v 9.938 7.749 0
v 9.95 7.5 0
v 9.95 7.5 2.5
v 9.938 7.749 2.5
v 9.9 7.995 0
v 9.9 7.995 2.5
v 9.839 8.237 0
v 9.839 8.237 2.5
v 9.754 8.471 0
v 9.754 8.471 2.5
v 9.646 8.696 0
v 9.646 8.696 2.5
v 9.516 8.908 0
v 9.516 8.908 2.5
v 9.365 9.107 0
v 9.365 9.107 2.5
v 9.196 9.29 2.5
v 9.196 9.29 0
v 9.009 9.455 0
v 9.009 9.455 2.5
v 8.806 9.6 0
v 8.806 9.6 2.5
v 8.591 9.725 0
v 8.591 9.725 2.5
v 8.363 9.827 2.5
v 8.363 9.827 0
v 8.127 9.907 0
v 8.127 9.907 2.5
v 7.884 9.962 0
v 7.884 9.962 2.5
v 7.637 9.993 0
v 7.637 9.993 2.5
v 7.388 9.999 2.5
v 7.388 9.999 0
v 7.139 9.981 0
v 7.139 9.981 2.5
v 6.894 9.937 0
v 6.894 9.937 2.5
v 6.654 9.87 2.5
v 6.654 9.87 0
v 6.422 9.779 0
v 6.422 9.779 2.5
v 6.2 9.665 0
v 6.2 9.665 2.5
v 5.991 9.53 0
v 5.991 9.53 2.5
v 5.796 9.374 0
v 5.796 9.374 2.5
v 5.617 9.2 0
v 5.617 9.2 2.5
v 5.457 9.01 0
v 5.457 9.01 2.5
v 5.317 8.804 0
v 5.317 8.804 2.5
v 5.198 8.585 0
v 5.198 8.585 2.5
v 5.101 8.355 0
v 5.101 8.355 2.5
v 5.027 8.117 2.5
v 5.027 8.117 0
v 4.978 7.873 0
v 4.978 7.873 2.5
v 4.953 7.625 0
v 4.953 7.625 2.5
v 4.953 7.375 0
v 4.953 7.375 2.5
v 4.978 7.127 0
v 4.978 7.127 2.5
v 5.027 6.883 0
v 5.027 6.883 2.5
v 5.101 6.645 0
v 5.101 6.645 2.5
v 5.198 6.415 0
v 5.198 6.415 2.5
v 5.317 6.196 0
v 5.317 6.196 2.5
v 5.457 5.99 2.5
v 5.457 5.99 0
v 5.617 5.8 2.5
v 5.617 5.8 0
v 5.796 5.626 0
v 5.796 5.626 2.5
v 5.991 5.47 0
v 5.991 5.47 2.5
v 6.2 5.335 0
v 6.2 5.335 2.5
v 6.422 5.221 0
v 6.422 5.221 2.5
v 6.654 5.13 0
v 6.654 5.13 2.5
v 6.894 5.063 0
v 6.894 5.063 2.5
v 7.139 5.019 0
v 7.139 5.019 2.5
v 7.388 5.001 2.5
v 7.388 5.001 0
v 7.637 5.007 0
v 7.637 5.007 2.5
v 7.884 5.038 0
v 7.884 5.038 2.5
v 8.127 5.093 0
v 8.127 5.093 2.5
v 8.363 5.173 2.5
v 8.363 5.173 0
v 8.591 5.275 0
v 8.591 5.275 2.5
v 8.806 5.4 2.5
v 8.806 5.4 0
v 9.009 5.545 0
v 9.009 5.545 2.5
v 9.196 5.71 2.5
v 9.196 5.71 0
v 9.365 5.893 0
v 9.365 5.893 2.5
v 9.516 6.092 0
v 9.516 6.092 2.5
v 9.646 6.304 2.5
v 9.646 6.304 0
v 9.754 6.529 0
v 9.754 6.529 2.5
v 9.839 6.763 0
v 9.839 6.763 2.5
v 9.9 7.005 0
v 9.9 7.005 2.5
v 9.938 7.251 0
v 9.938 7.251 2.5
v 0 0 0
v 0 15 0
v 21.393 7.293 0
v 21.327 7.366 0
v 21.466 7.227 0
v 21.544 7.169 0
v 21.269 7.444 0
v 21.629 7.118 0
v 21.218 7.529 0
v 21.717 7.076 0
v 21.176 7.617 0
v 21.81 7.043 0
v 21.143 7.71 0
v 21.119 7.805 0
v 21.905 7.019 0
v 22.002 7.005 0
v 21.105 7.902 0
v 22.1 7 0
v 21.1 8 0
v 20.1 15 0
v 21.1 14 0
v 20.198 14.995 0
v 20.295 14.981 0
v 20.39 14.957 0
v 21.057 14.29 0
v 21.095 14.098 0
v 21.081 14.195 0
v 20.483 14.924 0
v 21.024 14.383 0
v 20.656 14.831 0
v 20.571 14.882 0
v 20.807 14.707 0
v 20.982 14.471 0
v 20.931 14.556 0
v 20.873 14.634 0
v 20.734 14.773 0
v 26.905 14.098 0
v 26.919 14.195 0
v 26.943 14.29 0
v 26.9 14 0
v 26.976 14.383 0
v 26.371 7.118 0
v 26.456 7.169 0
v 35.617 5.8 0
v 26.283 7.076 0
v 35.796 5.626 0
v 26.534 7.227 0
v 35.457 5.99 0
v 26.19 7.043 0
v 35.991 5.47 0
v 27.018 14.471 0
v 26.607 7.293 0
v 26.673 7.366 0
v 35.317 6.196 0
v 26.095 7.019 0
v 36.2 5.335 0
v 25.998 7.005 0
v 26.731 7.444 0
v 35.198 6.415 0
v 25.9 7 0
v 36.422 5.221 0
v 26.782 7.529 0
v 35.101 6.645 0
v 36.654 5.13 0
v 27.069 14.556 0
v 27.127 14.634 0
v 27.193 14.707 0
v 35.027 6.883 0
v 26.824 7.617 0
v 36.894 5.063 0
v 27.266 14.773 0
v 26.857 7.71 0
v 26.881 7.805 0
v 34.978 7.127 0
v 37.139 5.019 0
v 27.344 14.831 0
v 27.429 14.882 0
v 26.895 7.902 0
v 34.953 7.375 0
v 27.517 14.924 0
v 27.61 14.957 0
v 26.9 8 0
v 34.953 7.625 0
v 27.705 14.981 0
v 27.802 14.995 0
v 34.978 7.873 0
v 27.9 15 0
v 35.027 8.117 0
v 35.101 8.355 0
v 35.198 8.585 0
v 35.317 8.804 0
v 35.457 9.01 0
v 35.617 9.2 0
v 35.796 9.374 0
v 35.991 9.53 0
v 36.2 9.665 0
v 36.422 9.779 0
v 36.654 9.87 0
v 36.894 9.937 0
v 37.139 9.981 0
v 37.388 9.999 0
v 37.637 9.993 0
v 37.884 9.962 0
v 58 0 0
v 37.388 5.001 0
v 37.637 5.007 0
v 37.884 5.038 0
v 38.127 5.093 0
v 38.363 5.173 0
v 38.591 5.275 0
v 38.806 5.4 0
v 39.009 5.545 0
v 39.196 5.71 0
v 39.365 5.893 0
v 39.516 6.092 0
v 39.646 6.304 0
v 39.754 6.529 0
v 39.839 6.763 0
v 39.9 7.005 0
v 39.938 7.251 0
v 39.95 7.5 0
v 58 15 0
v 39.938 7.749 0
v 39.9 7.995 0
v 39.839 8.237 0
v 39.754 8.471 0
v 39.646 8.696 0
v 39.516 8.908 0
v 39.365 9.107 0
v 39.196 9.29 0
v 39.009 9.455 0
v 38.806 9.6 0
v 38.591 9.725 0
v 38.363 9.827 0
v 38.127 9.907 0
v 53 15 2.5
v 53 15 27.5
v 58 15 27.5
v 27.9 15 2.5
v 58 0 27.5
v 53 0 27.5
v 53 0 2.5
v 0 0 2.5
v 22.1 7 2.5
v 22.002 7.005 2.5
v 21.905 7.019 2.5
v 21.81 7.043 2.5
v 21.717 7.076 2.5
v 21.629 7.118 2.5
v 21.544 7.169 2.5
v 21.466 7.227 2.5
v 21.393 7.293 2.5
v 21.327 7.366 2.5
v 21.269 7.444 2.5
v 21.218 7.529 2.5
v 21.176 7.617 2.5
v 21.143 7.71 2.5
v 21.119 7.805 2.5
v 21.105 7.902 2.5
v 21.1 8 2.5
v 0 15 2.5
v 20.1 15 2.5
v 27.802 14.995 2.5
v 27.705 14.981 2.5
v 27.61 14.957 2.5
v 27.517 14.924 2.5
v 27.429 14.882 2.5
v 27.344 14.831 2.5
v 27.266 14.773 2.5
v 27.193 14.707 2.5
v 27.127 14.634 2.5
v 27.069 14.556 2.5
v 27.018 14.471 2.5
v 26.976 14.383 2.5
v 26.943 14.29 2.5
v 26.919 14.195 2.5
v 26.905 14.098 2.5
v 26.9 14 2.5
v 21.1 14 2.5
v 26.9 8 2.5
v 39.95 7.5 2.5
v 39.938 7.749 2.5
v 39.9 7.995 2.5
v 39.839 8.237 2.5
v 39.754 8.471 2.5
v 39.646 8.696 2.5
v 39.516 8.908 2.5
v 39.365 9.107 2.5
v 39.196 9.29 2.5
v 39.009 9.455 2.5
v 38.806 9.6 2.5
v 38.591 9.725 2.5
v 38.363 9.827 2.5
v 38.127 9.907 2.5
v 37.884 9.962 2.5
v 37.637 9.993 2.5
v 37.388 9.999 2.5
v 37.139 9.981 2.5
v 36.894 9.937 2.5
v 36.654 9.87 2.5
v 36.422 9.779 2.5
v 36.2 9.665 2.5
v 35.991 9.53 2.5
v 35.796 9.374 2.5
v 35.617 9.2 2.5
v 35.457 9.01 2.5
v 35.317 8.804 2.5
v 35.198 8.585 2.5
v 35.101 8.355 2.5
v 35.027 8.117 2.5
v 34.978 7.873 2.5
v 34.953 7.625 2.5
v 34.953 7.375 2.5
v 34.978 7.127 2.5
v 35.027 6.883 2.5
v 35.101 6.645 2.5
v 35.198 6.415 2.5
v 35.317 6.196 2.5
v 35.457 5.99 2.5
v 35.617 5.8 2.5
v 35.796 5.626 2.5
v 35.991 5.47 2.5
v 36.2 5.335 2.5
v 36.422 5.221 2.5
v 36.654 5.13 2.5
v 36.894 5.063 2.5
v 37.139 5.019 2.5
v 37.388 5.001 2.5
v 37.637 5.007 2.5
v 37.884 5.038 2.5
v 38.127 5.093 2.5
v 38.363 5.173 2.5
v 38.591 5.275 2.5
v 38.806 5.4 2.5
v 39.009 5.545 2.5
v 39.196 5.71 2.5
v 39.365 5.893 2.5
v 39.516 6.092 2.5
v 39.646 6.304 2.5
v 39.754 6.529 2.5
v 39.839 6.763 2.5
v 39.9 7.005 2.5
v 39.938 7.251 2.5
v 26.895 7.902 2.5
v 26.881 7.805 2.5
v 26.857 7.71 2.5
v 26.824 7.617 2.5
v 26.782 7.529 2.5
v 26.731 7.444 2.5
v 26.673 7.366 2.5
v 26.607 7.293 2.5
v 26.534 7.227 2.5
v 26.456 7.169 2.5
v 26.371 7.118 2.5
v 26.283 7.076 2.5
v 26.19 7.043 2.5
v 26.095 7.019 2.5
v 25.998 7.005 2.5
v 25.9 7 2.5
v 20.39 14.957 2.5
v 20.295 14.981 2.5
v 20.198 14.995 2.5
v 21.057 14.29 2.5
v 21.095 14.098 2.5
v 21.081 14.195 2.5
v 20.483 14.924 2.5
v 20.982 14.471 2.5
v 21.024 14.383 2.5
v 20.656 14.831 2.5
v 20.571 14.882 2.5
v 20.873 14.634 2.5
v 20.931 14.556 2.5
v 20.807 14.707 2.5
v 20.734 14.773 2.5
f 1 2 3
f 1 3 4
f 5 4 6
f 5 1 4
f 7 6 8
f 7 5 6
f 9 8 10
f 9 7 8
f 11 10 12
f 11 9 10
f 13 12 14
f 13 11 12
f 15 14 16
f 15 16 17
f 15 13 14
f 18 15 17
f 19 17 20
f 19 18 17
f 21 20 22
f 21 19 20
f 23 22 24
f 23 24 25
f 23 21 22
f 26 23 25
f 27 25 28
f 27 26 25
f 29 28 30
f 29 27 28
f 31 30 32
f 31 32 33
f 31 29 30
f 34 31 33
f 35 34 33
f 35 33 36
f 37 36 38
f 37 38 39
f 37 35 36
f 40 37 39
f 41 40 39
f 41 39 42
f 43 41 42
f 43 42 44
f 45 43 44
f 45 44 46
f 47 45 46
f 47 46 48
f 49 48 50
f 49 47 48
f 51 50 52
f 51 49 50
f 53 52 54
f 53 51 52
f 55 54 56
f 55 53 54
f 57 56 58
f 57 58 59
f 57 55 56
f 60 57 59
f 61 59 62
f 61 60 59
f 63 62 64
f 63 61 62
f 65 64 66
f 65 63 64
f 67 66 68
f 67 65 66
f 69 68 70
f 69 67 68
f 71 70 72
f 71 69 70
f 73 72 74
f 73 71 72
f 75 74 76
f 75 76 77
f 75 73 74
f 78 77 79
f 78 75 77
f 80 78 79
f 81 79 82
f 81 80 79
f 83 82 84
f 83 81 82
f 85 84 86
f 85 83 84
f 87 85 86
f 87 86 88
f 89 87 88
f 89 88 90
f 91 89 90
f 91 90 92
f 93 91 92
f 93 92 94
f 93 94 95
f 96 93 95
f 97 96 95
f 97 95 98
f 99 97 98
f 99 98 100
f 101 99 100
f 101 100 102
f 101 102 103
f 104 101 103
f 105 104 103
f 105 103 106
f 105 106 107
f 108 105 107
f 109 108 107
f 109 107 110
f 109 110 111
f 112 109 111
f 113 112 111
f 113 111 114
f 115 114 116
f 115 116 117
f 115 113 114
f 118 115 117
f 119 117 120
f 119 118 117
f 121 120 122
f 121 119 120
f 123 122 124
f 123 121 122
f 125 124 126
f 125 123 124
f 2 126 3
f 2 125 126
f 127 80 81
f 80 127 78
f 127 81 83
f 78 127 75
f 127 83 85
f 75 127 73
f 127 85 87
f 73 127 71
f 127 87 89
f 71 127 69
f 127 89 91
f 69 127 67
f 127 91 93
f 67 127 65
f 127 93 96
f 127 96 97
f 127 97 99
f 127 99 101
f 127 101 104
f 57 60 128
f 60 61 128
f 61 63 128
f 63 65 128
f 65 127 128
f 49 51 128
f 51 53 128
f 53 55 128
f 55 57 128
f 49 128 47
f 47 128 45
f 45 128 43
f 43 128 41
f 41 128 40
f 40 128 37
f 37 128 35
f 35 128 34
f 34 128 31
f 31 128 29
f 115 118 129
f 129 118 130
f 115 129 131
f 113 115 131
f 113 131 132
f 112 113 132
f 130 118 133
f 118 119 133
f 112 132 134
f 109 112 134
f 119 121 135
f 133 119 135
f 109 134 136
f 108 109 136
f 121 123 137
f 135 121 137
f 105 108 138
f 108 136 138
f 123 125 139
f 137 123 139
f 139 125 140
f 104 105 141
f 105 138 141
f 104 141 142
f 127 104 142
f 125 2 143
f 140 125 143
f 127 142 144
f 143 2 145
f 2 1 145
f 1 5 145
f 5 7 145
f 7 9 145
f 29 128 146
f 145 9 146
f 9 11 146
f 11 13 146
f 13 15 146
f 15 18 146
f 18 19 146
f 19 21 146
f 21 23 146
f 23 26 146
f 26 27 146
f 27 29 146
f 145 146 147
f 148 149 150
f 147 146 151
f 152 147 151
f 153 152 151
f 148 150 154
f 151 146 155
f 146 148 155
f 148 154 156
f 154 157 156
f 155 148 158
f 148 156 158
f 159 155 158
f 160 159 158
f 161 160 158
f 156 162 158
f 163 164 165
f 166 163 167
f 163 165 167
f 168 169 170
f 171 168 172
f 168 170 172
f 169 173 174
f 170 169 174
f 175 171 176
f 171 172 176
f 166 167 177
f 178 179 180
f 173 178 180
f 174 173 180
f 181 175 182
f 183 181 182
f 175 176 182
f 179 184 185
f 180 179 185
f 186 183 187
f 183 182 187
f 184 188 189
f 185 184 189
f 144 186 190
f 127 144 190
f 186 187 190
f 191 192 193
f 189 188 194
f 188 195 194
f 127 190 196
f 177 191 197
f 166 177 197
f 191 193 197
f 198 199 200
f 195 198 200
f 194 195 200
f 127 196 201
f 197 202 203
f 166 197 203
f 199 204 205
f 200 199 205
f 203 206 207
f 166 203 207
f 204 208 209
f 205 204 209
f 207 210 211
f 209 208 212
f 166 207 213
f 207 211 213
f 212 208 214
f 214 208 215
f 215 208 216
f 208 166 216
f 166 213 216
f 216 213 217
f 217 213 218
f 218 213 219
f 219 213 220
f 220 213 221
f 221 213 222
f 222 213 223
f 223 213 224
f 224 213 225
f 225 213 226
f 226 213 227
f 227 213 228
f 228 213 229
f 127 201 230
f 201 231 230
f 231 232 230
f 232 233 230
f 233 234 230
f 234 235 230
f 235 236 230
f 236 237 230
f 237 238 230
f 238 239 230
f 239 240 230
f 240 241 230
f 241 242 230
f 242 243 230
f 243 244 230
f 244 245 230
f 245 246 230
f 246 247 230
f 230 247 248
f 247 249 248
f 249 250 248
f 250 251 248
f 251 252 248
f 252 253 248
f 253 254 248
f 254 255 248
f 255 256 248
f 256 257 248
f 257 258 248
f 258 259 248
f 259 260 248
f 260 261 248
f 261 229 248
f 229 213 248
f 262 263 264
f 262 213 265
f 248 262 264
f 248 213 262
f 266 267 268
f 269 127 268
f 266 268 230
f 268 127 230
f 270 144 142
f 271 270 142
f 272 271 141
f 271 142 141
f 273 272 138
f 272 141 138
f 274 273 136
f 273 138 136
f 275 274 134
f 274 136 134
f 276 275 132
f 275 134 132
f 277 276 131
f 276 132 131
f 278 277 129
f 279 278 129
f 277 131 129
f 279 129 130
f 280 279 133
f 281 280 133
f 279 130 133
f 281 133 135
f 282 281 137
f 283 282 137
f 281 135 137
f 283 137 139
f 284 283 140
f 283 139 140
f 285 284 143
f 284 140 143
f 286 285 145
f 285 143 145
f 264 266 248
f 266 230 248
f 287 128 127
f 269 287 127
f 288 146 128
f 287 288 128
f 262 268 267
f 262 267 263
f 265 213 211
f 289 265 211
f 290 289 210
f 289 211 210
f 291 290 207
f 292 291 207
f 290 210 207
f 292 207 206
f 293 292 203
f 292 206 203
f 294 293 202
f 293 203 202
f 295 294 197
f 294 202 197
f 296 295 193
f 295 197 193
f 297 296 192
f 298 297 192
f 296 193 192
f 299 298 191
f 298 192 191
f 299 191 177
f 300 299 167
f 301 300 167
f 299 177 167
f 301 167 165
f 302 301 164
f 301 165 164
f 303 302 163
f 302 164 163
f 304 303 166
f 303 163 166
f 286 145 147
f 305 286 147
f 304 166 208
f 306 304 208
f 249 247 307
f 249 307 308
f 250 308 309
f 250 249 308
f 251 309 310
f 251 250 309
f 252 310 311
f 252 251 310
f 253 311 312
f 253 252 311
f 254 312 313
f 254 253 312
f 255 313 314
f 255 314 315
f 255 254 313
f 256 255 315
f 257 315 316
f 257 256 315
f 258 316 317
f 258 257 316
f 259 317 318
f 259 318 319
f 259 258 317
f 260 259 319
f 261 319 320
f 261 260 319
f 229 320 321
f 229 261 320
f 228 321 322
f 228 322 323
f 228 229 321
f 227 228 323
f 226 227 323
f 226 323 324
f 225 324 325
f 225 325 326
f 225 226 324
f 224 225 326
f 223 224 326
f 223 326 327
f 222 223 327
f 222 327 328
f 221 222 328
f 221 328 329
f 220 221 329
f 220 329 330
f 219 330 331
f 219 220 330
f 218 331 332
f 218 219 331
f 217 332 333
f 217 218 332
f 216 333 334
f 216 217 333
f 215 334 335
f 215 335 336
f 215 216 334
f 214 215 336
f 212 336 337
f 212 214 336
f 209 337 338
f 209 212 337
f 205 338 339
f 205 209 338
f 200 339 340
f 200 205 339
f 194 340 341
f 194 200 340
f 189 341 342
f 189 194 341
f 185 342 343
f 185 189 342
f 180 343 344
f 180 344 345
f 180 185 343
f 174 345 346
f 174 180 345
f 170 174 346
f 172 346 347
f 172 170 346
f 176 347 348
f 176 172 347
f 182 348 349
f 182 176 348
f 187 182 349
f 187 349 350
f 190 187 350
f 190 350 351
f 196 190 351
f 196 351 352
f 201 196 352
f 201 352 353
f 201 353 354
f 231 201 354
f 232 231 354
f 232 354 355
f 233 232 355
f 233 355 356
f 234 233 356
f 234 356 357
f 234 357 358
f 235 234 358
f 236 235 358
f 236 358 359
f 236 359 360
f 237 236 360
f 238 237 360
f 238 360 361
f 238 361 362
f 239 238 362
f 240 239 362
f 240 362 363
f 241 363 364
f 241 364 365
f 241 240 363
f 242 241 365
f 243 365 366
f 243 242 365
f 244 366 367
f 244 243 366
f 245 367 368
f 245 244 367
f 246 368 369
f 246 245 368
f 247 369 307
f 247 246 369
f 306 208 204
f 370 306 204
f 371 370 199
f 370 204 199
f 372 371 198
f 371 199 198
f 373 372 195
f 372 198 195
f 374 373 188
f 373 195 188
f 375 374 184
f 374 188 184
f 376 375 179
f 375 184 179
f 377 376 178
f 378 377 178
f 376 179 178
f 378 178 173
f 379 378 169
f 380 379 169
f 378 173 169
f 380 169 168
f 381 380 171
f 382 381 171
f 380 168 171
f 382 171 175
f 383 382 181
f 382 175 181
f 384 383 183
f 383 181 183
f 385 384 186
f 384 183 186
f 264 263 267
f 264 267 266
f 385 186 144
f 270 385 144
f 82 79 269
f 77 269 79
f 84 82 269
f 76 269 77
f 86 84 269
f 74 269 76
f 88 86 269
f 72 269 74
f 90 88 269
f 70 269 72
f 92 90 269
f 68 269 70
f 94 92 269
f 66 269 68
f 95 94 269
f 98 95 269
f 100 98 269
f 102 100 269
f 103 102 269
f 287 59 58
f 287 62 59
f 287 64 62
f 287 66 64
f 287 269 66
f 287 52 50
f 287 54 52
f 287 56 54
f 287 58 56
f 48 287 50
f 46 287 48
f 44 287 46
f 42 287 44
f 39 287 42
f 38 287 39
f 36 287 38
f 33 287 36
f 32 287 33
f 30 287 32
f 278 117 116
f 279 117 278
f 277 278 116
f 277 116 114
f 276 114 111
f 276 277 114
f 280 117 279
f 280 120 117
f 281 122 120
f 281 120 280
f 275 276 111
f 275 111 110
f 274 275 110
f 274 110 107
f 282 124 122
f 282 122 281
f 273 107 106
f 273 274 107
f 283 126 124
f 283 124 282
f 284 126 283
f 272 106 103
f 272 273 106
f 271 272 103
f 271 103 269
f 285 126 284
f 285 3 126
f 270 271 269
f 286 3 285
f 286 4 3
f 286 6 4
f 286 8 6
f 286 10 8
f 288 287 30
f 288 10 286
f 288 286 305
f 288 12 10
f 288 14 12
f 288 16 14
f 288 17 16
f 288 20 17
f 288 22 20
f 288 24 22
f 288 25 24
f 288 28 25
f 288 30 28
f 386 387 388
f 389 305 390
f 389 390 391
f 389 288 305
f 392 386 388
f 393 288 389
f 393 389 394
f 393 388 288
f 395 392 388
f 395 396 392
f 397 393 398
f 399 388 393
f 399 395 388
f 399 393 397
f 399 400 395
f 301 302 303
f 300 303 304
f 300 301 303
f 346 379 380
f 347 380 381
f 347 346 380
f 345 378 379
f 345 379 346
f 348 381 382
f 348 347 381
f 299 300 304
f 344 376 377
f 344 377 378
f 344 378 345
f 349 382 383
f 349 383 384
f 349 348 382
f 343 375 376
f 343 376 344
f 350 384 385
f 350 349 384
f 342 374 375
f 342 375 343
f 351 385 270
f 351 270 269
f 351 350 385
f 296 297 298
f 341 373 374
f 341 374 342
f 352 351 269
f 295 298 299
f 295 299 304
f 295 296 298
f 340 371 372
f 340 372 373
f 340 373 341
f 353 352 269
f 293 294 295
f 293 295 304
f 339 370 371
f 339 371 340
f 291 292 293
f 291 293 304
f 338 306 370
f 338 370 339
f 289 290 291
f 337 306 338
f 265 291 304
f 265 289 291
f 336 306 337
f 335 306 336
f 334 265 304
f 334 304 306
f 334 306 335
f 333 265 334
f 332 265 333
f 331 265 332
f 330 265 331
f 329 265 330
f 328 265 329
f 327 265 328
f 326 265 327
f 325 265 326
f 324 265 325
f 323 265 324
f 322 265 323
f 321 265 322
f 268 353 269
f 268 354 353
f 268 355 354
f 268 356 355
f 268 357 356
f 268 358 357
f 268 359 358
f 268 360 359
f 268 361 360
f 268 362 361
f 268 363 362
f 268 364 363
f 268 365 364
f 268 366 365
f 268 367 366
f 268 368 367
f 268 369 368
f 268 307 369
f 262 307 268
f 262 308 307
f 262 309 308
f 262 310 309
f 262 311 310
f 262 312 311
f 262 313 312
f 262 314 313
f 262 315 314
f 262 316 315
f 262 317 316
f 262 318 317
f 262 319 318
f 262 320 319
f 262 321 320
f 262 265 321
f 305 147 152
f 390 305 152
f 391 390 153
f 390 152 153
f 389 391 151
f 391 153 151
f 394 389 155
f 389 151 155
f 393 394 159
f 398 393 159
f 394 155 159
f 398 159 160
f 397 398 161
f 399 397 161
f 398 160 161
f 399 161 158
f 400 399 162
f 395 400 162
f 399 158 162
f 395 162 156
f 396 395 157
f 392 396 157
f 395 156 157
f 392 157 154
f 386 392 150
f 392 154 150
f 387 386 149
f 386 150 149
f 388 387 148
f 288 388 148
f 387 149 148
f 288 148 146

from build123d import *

# Parameters (mm, degrees)
F0_R     = 2.5
F0_W     = 10
F0_H     = 15
F1_DEPTH = 2.5
F3_W     = 5
F3_H     = 15
F4_DEPTH = 25


with BuildPart() as f1:
    # F0 (on Top) → F1 (new body)
    with BuildSketch(Plane.XY):
        with BuildLine():
            Line((0, 15), (0, 0))
            Line((0, 0), (48, 0))
            Line((48, 0), (48, 15))
            Line((48, 15), (27.9, 15))
            ThreePointArc((27.9, 15), (27.192893, 14.707107), (26.9, 14))
            Line((26.9, 14), (26.9, 8))
            ThreePointArc((26.9, 8), (26.607107, 7.292893), (25.9, 7))
            Line((25.9, 7), (22.1, 7))
            ThreePointArc((22.1, 7), (21.392893, 7.292893), (21.1, 8))
            Line((21.1, 8), (21.1, 14))
            ThreePointArc((21.1, 14), (20.807107, 14.707107), (20.1, 15))
            Line((20.1, 15), (0, 15))
        make_face()
        with Locations((7.45, 7.5)):
            Circle(F0_R, mode=Mode.SUBTRACT)
        with Locations((37.45, 7.5)):
            Circle(F0_R, mode=Mode.SUBTRACT)
        with Locations((53, 7.5)):
            Rectangle(F0_W, F0_H)
    extrude(amount=F1_DEPTH)

    # F3 (on offset) → F4 (join)
    with BuildSketch(Plane.XY.offset(2.5)):
        with Locations((55.5, 7.5)):
            Rectangle(F3_W, F3_H)
    extrude(amount=F4_DEPTH)


solid = f1.part
